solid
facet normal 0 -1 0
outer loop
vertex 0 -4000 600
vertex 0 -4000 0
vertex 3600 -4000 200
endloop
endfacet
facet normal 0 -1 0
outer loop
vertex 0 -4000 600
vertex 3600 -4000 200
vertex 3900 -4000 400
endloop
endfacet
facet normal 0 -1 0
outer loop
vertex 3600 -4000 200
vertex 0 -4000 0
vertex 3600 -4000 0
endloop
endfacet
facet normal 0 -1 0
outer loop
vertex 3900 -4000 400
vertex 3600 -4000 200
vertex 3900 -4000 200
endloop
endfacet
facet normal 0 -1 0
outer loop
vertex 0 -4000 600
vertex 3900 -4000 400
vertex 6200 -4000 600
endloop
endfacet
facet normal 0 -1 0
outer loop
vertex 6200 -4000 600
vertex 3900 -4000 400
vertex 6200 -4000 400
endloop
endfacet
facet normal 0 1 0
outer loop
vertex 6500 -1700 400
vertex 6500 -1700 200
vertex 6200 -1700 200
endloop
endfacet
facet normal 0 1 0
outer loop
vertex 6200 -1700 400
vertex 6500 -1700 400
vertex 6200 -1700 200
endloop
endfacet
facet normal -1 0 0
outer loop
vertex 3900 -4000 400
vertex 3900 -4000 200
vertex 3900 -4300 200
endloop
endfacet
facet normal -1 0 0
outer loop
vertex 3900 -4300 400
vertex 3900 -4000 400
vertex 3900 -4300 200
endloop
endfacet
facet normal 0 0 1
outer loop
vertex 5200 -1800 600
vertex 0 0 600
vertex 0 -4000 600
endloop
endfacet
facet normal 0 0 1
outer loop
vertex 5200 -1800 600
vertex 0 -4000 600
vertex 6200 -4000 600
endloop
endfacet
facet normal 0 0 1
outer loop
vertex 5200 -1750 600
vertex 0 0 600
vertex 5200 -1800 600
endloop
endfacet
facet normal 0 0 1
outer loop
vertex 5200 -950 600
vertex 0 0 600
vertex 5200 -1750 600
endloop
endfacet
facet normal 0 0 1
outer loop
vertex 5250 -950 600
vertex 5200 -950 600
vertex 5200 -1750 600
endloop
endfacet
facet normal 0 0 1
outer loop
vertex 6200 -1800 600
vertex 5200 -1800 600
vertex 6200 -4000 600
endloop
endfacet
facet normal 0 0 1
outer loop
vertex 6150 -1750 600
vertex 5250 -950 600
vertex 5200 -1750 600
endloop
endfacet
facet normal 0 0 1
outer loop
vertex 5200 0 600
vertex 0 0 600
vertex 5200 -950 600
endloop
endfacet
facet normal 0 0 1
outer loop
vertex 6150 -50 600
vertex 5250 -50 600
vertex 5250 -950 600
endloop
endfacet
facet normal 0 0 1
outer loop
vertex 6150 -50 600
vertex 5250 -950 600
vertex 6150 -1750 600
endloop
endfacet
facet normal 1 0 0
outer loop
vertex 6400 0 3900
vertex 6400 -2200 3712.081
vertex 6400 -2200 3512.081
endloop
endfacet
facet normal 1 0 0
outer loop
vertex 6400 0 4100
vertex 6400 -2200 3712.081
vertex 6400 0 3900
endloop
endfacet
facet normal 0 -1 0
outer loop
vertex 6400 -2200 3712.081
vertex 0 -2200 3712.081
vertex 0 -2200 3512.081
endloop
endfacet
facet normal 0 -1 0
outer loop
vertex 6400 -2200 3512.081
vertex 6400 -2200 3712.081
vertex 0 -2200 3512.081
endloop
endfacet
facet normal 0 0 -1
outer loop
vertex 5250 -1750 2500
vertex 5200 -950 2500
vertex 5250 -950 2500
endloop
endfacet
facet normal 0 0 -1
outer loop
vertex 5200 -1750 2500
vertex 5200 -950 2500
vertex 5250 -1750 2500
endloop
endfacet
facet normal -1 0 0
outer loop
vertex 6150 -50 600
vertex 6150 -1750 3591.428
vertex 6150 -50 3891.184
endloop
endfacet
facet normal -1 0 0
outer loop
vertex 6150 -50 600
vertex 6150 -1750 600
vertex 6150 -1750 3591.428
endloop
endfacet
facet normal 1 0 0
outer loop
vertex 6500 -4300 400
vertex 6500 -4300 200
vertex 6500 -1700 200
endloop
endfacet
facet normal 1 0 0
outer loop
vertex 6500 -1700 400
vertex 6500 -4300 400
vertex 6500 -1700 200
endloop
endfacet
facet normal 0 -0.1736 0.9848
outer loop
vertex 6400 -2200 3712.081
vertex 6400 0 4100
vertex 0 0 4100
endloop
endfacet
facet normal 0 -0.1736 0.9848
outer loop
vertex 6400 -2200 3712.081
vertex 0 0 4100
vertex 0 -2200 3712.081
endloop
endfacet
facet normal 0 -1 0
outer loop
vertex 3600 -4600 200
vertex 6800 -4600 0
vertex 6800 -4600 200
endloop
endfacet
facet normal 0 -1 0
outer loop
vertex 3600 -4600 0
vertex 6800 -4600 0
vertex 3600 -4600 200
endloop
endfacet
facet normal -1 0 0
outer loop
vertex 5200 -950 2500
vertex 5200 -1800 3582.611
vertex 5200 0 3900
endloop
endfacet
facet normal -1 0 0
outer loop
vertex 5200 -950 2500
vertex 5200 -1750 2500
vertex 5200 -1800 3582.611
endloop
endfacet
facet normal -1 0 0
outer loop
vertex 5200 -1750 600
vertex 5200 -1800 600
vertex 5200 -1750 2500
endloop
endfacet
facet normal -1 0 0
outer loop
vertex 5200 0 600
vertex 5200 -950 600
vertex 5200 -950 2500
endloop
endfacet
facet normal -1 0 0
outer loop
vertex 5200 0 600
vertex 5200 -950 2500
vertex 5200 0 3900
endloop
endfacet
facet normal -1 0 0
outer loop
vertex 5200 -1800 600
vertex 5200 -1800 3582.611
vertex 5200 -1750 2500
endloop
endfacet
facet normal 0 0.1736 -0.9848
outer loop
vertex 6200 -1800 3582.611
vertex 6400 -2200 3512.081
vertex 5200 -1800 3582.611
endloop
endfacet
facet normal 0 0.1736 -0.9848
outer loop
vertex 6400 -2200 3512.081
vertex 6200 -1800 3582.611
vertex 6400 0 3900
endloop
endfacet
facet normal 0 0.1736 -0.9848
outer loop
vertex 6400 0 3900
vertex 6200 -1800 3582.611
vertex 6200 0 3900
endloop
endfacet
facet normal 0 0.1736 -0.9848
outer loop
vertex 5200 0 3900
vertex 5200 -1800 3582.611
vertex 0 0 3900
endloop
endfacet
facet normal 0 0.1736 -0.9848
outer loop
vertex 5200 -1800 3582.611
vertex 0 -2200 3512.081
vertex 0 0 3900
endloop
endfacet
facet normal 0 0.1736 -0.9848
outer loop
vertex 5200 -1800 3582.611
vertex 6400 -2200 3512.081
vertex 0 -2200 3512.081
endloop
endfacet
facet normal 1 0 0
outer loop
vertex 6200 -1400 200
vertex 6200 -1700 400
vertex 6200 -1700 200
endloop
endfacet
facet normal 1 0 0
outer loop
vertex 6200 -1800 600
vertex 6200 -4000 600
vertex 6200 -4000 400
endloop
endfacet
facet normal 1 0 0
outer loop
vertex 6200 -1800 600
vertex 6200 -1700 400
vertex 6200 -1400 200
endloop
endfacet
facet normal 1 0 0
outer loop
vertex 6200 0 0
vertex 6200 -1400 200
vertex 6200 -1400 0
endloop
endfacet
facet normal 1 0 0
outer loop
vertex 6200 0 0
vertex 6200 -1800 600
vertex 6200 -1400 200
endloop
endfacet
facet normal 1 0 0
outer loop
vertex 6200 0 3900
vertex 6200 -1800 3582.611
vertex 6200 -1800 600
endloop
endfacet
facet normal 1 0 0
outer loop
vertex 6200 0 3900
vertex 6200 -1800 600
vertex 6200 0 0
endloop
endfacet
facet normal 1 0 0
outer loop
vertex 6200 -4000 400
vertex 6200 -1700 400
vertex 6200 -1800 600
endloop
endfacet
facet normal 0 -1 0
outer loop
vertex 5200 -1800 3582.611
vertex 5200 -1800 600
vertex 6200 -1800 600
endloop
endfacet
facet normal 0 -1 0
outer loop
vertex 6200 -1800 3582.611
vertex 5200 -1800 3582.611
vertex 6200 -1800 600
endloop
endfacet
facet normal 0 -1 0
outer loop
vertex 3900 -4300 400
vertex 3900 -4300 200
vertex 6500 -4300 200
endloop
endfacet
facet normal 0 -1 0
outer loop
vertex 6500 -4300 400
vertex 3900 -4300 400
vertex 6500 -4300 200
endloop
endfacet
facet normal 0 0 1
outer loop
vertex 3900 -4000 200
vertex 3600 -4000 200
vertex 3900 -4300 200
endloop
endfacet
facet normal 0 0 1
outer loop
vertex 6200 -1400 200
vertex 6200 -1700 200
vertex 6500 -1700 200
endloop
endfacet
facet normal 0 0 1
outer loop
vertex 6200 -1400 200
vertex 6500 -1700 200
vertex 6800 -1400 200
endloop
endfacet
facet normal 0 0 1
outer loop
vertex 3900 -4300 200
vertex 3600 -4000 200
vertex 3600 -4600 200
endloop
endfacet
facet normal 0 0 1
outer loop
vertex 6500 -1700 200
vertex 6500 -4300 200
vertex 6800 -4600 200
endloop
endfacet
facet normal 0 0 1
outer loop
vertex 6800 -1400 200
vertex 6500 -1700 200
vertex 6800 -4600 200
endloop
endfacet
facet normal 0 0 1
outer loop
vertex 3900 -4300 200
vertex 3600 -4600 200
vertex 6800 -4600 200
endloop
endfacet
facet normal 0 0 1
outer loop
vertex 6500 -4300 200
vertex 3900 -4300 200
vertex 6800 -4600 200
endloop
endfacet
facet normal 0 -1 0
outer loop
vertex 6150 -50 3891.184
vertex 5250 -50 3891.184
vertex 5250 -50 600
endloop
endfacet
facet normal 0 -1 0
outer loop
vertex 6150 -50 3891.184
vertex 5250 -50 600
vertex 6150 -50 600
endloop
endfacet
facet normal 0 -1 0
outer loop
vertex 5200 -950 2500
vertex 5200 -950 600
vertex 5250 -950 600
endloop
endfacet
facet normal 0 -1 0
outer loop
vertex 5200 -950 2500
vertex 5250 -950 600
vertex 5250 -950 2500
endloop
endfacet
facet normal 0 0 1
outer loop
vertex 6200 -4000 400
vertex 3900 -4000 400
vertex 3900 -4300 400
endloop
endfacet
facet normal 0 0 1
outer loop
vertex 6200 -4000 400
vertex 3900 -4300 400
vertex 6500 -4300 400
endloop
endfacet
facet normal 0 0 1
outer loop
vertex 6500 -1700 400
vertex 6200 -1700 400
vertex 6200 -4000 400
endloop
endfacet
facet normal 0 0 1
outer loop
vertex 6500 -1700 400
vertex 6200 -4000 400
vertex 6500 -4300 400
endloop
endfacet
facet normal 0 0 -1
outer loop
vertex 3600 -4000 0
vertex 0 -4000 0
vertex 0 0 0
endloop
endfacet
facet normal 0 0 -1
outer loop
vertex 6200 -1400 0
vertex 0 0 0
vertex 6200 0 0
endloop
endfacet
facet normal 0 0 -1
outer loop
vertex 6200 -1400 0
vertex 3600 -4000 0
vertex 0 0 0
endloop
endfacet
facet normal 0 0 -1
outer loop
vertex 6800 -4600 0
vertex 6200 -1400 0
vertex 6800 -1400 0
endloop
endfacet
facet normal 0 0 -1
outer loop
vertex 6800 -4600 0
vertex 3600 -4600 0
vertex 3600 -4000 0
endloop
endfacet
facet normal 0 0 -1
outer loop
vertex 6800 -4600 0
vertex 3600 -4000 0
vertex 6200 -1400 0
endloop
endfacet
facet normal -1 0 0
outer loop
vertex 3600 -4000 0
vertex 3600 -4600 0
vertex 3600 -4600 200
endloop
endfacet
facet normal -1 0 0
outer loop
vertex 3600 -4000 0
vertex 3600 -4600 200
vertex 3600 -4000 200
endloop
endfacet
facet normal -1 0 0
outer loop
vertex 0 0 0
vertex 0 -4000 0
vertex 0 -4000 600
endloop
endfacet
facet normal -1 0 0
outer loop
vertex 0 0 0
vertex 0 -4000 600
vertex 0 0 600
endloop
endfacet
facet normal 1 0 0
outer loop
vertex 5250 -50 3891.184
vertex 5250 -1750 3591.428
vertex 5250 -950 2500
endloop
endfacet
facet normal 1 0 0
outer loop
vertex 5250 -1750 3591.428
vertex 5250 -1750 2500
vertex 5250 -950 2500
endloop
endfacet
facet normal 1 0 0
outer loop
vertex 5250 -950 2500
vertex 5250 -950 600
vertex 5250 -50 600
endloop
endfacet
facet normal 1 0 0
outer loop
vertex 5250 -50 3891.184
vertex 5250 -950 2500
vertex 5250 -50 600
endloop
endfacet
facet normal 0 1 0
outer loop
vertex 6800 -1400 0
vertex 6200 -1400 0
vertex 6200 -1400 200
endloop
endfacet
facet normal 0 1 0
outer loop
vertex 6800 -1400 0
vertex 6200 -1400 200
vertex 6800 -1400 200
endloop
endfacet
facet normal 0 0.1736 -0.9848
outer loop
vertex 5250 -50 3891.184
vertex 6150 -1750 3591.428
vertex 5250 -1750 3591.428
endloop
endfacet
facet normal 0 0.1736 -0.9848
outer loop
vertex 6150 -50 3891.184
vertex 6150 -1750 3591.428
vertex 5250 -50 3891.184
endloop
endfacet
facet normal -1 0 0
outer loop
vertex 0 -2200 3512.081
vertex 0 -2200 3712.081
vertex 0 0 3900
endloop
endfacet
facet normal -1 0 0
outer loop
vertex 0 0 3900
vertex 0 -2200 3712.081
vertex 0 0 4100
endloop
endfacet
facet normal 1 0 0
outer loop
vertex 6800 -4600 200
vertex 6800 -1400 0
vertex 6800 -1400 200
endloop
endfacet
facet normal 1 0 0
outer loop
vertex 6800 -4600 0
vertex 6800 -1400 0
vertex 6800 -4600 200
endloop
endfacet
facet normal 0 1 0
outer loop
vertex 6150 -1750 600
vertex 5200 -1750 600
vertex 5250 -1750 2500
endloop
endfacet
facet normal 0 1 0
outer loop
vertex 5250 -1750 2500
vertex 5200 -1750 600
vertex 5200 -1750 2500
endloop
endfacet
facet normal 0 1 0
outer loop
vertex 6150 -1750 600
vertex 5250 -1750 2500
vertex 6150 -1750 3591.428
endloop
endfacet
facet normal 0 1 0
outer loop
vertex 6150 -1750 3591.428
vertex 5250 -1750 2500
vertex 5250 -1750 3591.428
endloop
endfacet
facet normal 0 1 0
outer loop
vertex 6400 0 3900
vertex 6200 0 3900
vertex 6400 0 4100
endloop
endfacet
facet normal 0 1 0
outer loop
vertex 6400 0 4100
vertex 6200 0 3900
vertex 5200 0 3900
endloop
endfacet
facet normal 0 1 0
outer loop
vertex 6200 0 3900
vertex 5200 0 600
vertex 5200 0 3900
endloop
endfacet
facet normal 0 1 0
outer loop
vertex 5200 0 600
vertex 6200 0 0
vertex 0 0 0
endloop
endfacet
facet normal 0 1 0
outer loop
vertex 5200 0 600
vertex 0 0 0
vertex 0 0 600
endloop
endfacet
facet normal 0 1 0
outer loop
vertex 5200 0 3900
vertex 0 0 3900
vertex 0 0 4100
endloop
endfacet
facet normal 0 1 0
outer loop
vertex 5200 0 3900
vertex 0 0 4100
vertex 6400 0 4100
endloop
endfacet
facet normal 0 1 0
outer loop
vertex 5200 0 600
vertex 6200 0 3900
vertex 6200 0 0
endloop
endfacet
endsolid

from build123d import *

# Parameters (mm, degrees)
F0_W      = 6200
F0_H      = 4000
F1_DEPTH  = 600
F3_DEPTH  = 200
F5_DEPTH  = 200
F6_W      = 1000
F6_H      = 1800
F6_W_2    = 900
F6_H_2    = 1700
F7_DEPTH  = 3300
F9_DEPTH  = 6200.001
F11_DEPTH = 6200
F12_DEPTH = 200
F13_W     = 800
F13_H     = 1900
F14_DEPTH = 50


with BuildPart() as f1:
    # F0 (on Top) → F1 (new body)
    with BuildSketch(Plane.XY):
        with Locations((3100, -2000)):
            Rectangle(F0_W, F0_H)
    extrude(amount=F1_DEPTH)

    # F2 (on face) → F3 (join)
    with BuildSketch(Plane(origin=(0, 0, 0), x_dir=(1, 0, 0), z_dir=(0, 0, -1))):
        Polygon((6200, 4000), (6200, 1400), (6800, 1400), (6800, 4600), (3600, 4600), (3600, 4000), align=None)
    extrude(amount=-F3_DEPTH)

    # F4 (on face) → F5 (join)
    with BuildSketch(Plane.XY.offset(200)):
        Polygon((3900, -4000), (3900, -4300), (6500, -4300), (6500, -1700), (6200, -1700), (6200, -4000), align=None)
    extrude(amount=F5_DEPTH)

    # F6 (on face) → F7 (join)
    with BuildSketch(Plane.XY.offset(600)):
        with Locations((5700, -900)):
            Rectangle(F6_W, F6_H)
        with Locations((5700, -900)):
            Rectangle(F6_W_2, F6_H_2, mode=Mode.SUBTRACT)
    extrude(amount=F7_DEPTH)

    # F8 (on face) → F9 (cut, through all)
    with BuildSketch(Plane.YZ.offset(6200)):
        Polygon((-1800, 3582.611435), (0, 3900), (-1800, 3900), align=None)
    extrude(amount=-F9_DEPTH, mode=Mode.SUBTRACT)

    # F10 (on face) → F11 (join)
    with BuildSketch(Plane.YZ.offset(6200)):
        Polygon((-2200, 3512.080642), (0, 3900), (0, 4100), (-2200, 3712.080642), align=None)
    extrude(amount=-F11_DEPTH)

    # F10 (on face) → F12 (join)
    with BuildSketch(Plane.YZ.offset(6200)):
        Polygon((-2200, 3512.080642), (0, 3900), (0, 4100), (-2200, 3712.080642), align=None)
    extrude(amount=F12_DEPTH)

    # F13 (on face) → F14 (cut, through all)
    with BuildSketch(Plane(origin=(5200, 0, 0), x_dir=(0, -1, 0), z_dir=(-1, 0, 0))):
        with Locations((1350, 1550)):
            Rectangle(F13_W, F13_H)
    extrude(amount=-F14_DEPTH, mode=Mode.SUBTRACT)


solid = f1.part
